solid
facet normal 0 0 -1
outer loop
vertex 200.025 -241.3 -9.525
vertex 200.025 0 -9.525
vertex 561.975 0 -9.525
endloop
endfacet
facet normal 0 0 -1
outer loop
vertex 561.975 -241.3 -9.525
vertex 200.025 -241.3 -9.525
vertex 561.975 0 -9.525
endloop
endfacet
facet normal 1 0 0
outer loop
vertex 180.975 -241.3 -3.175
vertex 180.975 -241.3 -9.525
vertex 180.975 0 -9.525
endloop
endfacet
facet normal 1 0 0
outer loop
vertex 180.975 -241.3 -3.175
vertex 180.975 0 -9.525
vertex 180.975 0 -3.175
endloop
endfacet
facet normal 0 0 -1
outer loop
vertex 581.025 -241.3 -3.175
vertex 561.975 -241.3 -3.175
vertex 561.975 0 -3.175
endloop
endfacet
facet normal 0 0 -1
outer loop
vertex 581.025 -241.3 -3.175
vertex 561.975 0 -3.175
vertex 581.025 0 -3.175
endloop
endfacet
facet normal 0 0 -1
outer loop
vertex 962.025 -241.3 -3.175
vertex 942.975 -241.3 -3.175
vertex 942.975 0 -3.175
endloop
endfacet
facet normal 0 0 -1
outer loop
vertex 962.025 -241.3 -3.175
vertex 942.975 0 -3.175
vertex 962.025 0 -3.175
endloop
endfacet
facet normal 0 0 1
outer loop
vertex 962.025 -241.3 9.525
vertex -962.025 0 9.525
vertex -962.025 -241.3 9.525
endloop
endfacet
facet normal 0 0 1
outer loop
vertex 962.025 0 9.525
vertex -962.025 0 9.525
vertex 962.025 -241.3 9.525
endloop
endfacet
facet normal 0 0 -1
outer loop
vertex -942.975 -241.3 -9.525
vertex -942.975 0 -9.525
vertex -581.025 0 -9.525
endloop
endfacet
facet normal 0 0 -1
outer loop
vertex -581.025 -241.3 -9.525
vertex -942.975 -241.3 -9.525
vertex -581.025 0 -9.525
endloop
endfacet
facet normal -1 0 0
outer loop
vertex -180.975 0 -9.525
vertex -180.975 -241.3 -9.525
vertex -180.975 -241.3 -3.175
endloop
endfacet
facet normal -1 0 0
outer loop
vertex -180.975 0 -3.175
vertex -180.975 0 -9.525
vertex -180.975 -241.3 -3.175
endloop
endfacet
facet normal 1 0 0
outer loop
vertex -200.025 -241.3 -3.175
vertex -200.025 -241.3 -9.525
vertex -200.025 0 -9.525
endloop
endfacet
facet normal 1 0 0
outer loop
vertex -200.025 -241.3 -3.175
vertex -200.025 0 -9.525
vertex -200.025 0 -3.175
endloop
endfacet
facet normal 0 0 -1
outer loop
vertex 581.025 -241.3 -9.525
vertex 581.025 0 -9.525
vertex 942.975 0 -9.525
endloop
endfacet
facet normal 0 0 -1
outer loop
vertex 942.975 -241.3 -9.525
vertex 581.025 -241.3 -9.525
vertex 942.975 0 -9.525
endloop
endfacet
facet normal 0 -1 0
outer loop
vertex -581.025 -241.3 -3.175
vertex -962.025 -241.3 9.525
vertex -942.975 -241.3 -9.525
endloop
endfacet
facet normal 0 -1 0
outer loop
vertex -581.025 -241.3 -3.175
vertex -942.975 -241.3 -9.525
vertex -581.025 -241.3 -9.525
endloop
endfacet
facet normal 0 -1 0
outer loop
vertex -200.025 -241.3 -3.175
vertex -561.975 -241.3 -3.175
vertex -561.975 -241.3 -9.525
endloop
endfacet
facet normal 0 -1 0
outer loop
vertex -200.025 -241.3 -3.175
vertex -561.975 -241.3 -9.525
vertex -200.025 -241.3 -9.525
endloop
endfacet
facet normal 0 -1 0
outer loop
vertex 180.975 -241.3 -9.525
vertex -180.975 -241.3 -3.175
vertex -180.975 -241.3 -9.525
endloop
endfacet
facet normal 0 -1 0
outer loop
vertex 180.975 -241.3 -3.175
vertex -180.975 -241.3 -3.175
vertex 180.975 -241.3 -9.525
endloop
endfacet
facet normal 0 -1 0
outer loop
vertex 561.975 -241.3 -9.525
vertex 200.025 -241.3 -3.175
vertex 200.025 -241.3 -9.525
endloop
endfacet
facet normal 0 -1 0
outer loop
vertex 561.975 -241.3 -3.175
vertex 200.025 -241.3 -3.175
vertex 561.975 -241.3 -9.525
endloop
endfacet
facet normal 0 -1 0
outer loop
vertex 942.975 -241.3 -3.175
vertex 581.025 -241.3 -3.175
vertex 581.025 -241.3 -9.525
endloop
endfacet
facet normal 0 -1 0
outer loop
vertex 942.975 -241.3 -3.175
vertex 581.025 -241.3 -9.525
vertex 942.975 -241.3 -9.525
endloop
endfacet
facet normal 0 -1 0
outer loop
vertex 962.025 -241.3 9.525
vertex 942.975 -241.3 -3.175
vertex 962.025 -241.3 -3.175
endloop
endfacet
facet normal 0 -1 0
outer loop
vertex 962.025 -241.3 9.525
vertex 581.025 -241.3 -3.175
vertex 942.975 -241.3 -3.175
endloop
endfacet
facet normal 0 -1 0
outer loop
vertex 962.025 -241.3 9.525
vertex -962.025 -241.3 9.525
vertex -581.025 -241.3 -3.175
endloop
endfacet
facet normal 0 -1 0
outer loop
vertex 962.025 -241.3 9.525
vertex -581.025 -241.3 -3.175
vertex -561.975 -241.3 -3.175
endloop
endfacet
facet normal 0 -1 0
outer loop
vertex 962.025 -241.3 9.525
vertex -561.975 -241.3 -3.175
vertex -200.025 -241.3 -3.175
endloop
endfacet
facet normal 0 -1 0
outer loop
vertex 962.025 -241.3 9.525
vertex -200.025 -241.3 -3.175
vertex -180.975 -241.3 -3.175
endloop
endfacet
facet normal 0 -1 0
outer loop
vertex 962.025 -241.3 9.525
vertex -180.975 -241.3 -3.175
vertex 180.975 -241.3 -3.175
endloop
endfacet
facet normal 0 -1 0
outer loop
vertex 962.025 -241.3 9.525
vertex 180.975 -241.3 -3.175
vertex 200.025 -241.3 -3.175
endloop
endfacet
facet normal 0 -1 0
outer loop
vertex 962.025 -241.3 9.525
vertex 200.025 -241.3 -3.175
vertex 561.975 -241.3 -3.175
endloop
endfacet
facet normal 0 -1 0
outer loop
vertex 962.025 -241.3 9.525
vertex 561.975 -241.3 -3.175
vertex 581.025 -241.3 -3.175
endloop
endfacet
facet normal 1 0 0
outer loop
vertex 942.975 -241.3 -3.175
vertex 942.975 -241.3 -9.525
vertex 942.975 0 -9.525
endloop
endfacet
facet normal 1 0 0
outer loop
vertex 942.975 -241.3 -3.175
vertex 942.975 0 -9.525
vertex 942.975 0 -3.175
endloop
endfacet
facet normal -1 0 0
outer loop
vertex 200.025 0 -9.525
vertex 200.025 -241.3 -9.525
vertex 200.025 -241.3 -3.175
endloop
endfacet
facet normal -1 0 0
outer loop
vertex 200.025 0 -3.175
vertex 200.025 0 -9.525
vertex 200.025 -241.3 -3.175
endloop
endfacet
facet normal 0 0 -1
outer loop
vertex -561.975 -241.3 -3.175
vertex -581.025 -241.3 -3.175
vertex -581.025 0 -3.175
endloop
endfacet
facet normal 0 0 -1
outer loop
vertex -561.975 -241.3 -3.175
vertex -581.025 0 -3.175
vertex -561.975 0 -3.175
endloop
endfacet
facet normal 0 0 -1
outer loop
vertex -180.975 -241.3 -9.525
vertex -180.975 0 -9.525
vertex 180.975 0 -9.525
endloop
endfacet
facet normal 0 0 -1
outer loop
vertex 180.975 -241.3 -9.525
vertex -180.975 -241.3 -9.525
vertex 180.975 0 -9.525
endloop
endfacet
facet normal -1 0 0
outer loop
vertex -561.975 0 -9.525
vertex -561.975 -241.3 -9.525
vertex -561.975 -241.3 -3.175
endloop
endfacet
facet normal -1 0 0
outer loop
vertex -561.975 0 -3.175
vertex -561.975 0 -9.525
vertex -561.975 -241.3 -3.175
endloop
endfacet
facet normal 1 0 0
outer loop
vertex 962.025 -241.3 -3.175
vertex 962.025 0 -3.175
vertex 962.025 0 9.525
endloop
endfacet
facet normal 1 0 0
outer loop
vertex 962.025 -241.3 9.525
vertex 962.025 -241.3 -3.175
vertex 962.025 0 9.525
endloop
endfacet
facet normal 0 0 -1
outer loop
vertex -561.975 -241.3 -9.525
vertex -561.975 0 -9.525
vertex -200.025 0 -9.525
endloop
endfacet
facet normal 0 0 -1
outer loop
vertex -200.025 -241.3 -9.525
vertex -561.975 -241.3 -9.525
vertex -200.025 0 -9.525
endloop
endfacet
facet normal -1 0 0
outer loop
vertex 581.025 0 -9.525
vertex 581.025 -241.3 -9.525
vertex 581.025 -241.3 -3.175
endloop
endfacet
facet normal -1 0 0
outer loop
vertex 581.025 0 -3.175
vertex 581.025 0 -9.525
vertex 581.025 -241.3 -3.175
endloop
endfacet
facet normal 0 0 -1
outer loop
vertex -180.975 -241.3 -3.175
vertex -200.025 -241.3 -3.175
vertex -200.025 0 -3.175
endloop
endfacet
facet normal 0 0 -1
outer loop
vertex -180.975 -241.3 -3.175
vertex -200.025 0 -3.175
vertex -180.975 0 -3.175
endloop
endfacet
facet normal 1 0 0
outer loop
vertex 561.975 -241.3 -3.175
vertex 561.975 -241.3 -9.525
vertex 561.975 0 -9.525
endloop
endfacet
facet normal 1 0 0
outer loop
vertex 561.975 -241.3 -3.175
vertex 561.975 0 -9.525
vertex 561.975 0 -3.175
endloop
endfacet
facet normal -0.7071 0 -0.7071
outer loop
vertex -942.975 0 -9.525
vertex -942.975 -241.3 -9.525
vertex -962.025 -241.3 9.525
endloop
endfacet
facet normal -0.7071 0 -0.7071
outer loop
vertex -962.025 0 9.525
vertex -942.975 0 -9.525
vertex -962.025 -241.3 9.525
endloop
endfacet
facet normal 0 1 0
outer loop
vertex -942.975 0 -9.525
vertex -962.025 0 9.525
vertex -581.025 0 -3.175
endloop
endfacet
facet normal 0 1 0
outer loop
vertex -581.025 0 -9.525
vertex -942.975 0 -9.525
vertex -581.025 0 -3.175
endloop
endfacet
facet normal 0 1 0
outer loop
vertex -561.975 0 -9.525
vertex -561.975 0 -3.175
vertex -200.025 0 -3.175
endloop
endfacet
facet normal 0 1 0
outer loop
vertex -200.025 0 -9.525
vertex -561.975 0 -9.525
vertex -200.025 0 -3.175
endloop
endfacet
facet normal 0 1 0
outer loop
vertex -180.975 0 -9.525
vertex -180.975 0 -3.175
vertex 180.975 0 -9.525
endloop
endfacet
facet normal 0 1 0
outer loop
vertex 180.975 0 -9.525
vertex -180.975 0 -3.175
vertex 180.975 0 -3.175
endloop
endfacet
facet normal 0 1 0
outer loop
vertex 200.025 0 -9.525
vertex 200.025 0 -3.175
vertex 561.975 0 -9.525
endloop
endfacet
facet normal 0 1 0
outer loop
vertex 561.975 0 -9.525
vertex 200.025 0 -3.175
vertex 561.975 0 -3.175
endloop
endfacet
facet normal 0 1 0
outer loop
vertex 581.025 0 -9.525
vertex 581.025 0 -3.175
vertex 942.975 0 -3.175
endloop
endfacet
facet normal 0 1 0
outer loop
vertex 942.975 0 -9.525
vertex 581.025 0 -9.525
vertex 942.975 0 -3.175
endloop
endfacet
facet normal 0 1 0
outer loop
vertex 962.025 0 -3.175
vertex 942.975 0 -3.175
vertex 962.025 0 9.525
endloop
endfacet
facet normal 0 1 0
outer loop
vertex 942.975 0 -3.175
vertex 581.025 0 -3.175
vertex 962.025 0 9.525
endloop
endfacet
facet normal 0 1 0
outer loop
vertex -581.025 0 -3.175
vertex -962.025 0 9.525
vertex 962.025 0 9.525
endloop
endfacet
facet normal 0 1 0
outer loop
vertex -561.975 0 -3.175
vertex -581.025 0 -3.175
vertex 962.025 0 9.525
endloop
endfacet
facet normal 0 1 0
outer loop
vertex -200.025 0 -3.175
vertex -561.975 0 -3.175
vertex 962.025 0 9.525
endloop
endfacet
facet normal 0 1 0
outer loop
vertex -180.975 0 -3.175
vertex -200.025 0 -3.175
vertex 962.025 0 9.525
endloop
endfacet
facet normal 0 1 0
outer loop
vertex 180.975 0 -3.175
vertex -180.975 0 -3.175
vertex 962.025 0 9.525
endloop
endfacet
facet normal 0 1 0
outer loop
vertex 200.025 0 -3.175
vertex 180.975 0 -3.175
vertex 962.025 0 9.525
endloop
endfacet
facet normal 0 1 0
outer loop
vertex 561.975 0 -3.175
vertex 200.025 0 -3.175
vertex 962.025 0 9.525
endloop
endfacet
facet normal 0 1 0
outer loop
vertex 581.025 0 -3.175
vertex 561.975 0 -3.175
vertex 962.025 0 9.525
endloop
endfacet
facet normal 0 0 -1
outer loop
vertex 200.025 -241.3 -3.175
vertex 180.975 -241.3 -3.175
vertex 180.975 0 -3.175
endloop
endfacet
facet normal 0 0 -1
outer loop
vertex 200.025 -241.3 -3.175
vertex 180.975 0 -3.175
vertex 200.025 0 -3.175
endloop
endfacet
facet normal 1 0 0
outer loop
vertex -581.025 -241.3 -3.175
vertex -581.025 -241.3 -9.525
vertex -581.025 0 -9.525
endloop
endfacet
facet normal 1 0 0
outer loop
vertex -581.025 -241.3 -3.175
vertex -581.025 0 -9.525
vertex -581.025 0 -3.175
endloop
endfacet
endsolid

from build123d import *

# Parameters (mm, degrees)
F0_W     = 1924.05
F0_H     = 19.05
F1_DEPTH = 241.3
F3_DEPTH = 241.301
F4_W     = 19.05
F4_H     = 12.7
F4_H_2   = 6.35
F5_DEPTH = 241.301


with BuildPart() as f1:
    # F0 (on Front) → F1 (new body)
    with BuildSketch(Plane.XZ):
        Rectangle(F0_W, F0_H)
    extrude(amount=F1_DEPTH)

    # F2 (on face) → F3 (cut, through all)
    with BuildSketch(Plane.XZ.offset(241.3)):
        Polygon((-942.975, -9.525), (-962.025, 9.525), (-962.025, -9.525), align=None)
    extrude(amount=-F3_DEPTH, mode=Mode.SUBTRACT)

    # F4 (on face) → F5 (cut, through all)
    with BuildSketch(Plane.XZ.offset(241.3)):
        with Locations((-571.5, -9.525)):
            Rectangle(F4_W, F4_H)
        with Locations((-190.5, -9.525)):
            Rectangle(F4_W, F4_H)
        with Locations((571.5, -9.525)):
            Rectangle(F4_W, F4_H)
        with Locations((190.5, -9.525)):
            Rectangle(F4_W, F4_H)
        with Locations((952.5, -6.35)):
            Rectangle(F4_W, F4_H_2)
    extrude(amount=-F5_DEPTH, mode=Mode.SUBTRACT)


solid = f1.part
